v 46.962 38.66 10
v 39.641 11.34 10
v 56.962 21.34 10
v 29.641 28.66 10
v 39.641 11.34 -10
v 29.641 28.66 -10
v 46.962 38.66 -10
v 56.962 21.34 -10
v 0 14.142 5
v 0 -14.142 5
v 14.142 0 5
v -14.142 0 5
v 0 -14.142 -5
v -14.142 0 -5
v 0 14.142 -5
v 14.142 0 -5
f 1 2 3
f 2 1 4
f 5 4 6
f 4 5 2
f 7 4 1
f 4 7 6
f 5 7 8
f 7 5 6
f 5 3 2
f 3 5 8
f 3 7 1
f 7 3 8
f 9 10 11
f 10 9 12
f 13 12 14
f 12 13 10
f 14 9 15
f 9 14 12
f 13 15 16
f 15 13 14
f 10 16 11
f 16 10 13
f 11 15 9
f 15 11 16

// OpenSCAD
// ejemplo de translacion y rotacion

// translacion y rotacion de un cubo
rotate([0,0,30])
    translate([50,0,0])
        cube([20,20,20],center=true);
//rotacion de un cubo
rotate([0,0,45])    
    cube([20,20,10],center=true);
